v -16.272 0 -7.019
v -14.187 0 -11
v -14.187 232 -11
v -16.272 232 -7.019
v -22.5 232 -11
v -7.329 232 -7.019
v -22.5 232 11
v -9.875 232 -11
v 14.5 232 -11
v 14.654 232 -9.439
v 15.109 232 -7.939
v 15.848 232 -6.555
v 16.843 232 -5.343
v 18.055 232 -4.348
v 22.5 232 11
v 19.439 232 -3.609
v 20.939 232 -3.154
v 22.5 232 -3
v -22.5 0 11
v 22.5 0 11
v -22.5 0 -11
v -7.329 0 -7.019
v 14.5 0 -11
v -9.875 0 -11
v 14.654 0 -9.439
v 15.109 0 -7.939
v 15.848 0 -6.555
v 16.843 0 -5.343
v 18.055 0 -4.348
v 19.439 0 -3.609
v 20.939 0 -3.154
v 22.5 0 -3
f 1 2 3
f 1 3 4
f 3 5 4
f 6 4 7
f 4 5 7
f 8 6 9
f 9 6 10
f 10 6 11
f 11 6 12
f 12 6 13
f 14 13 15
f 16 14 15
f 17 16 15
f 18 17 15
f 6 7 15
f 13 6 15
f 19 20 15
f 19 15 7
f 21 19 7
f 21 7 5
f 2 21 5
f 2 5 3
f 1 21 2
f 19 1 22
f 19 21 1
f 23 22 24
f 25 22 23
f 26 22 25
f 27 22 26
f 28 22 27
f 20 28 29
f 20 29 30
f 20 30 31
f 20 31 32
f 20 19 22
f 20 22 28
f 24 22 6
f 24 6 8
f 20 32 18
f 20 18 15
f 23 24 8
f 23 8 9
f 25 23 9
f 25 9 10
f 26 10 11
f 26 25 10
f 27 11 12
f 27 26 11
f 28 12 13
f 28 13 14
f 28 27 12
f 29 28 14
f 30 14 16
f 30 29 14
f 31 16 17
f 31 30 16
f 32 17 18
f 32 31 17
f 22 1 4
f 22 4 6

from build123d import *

# Parameters (mm, degrees)
F1_DEPTH = 232


with BuildPart() as f1:
    # F0 (on Front) → F1 (new body)
    with BuildSketch(Plane.XZ):
        with BuildLine():
            Line((22.5, -3), (22.5, 11))
            Line((22.5, 11), (-22.5, 11))
            Line((-22.5, 11), (-22.5, -11))
            Line((-22.5, -11), (-14.187015, -11))
            Line((-14.187015, -11), (-16.271666, -7.018649))
            Line((-16.271666, -7.018649), (-7.329346, -7.018649))
            Line((-7.329346, -7.018649), (-9.875086, -11))
            Line((-9.875086, -11), (14.5, -11))
            ThreePointArc((14.5, -11), (16.843146, -5.343146), (22.5, -3))
        make_face()
    extrude(amount=-F1_DEPTH)


solid = f1.part
